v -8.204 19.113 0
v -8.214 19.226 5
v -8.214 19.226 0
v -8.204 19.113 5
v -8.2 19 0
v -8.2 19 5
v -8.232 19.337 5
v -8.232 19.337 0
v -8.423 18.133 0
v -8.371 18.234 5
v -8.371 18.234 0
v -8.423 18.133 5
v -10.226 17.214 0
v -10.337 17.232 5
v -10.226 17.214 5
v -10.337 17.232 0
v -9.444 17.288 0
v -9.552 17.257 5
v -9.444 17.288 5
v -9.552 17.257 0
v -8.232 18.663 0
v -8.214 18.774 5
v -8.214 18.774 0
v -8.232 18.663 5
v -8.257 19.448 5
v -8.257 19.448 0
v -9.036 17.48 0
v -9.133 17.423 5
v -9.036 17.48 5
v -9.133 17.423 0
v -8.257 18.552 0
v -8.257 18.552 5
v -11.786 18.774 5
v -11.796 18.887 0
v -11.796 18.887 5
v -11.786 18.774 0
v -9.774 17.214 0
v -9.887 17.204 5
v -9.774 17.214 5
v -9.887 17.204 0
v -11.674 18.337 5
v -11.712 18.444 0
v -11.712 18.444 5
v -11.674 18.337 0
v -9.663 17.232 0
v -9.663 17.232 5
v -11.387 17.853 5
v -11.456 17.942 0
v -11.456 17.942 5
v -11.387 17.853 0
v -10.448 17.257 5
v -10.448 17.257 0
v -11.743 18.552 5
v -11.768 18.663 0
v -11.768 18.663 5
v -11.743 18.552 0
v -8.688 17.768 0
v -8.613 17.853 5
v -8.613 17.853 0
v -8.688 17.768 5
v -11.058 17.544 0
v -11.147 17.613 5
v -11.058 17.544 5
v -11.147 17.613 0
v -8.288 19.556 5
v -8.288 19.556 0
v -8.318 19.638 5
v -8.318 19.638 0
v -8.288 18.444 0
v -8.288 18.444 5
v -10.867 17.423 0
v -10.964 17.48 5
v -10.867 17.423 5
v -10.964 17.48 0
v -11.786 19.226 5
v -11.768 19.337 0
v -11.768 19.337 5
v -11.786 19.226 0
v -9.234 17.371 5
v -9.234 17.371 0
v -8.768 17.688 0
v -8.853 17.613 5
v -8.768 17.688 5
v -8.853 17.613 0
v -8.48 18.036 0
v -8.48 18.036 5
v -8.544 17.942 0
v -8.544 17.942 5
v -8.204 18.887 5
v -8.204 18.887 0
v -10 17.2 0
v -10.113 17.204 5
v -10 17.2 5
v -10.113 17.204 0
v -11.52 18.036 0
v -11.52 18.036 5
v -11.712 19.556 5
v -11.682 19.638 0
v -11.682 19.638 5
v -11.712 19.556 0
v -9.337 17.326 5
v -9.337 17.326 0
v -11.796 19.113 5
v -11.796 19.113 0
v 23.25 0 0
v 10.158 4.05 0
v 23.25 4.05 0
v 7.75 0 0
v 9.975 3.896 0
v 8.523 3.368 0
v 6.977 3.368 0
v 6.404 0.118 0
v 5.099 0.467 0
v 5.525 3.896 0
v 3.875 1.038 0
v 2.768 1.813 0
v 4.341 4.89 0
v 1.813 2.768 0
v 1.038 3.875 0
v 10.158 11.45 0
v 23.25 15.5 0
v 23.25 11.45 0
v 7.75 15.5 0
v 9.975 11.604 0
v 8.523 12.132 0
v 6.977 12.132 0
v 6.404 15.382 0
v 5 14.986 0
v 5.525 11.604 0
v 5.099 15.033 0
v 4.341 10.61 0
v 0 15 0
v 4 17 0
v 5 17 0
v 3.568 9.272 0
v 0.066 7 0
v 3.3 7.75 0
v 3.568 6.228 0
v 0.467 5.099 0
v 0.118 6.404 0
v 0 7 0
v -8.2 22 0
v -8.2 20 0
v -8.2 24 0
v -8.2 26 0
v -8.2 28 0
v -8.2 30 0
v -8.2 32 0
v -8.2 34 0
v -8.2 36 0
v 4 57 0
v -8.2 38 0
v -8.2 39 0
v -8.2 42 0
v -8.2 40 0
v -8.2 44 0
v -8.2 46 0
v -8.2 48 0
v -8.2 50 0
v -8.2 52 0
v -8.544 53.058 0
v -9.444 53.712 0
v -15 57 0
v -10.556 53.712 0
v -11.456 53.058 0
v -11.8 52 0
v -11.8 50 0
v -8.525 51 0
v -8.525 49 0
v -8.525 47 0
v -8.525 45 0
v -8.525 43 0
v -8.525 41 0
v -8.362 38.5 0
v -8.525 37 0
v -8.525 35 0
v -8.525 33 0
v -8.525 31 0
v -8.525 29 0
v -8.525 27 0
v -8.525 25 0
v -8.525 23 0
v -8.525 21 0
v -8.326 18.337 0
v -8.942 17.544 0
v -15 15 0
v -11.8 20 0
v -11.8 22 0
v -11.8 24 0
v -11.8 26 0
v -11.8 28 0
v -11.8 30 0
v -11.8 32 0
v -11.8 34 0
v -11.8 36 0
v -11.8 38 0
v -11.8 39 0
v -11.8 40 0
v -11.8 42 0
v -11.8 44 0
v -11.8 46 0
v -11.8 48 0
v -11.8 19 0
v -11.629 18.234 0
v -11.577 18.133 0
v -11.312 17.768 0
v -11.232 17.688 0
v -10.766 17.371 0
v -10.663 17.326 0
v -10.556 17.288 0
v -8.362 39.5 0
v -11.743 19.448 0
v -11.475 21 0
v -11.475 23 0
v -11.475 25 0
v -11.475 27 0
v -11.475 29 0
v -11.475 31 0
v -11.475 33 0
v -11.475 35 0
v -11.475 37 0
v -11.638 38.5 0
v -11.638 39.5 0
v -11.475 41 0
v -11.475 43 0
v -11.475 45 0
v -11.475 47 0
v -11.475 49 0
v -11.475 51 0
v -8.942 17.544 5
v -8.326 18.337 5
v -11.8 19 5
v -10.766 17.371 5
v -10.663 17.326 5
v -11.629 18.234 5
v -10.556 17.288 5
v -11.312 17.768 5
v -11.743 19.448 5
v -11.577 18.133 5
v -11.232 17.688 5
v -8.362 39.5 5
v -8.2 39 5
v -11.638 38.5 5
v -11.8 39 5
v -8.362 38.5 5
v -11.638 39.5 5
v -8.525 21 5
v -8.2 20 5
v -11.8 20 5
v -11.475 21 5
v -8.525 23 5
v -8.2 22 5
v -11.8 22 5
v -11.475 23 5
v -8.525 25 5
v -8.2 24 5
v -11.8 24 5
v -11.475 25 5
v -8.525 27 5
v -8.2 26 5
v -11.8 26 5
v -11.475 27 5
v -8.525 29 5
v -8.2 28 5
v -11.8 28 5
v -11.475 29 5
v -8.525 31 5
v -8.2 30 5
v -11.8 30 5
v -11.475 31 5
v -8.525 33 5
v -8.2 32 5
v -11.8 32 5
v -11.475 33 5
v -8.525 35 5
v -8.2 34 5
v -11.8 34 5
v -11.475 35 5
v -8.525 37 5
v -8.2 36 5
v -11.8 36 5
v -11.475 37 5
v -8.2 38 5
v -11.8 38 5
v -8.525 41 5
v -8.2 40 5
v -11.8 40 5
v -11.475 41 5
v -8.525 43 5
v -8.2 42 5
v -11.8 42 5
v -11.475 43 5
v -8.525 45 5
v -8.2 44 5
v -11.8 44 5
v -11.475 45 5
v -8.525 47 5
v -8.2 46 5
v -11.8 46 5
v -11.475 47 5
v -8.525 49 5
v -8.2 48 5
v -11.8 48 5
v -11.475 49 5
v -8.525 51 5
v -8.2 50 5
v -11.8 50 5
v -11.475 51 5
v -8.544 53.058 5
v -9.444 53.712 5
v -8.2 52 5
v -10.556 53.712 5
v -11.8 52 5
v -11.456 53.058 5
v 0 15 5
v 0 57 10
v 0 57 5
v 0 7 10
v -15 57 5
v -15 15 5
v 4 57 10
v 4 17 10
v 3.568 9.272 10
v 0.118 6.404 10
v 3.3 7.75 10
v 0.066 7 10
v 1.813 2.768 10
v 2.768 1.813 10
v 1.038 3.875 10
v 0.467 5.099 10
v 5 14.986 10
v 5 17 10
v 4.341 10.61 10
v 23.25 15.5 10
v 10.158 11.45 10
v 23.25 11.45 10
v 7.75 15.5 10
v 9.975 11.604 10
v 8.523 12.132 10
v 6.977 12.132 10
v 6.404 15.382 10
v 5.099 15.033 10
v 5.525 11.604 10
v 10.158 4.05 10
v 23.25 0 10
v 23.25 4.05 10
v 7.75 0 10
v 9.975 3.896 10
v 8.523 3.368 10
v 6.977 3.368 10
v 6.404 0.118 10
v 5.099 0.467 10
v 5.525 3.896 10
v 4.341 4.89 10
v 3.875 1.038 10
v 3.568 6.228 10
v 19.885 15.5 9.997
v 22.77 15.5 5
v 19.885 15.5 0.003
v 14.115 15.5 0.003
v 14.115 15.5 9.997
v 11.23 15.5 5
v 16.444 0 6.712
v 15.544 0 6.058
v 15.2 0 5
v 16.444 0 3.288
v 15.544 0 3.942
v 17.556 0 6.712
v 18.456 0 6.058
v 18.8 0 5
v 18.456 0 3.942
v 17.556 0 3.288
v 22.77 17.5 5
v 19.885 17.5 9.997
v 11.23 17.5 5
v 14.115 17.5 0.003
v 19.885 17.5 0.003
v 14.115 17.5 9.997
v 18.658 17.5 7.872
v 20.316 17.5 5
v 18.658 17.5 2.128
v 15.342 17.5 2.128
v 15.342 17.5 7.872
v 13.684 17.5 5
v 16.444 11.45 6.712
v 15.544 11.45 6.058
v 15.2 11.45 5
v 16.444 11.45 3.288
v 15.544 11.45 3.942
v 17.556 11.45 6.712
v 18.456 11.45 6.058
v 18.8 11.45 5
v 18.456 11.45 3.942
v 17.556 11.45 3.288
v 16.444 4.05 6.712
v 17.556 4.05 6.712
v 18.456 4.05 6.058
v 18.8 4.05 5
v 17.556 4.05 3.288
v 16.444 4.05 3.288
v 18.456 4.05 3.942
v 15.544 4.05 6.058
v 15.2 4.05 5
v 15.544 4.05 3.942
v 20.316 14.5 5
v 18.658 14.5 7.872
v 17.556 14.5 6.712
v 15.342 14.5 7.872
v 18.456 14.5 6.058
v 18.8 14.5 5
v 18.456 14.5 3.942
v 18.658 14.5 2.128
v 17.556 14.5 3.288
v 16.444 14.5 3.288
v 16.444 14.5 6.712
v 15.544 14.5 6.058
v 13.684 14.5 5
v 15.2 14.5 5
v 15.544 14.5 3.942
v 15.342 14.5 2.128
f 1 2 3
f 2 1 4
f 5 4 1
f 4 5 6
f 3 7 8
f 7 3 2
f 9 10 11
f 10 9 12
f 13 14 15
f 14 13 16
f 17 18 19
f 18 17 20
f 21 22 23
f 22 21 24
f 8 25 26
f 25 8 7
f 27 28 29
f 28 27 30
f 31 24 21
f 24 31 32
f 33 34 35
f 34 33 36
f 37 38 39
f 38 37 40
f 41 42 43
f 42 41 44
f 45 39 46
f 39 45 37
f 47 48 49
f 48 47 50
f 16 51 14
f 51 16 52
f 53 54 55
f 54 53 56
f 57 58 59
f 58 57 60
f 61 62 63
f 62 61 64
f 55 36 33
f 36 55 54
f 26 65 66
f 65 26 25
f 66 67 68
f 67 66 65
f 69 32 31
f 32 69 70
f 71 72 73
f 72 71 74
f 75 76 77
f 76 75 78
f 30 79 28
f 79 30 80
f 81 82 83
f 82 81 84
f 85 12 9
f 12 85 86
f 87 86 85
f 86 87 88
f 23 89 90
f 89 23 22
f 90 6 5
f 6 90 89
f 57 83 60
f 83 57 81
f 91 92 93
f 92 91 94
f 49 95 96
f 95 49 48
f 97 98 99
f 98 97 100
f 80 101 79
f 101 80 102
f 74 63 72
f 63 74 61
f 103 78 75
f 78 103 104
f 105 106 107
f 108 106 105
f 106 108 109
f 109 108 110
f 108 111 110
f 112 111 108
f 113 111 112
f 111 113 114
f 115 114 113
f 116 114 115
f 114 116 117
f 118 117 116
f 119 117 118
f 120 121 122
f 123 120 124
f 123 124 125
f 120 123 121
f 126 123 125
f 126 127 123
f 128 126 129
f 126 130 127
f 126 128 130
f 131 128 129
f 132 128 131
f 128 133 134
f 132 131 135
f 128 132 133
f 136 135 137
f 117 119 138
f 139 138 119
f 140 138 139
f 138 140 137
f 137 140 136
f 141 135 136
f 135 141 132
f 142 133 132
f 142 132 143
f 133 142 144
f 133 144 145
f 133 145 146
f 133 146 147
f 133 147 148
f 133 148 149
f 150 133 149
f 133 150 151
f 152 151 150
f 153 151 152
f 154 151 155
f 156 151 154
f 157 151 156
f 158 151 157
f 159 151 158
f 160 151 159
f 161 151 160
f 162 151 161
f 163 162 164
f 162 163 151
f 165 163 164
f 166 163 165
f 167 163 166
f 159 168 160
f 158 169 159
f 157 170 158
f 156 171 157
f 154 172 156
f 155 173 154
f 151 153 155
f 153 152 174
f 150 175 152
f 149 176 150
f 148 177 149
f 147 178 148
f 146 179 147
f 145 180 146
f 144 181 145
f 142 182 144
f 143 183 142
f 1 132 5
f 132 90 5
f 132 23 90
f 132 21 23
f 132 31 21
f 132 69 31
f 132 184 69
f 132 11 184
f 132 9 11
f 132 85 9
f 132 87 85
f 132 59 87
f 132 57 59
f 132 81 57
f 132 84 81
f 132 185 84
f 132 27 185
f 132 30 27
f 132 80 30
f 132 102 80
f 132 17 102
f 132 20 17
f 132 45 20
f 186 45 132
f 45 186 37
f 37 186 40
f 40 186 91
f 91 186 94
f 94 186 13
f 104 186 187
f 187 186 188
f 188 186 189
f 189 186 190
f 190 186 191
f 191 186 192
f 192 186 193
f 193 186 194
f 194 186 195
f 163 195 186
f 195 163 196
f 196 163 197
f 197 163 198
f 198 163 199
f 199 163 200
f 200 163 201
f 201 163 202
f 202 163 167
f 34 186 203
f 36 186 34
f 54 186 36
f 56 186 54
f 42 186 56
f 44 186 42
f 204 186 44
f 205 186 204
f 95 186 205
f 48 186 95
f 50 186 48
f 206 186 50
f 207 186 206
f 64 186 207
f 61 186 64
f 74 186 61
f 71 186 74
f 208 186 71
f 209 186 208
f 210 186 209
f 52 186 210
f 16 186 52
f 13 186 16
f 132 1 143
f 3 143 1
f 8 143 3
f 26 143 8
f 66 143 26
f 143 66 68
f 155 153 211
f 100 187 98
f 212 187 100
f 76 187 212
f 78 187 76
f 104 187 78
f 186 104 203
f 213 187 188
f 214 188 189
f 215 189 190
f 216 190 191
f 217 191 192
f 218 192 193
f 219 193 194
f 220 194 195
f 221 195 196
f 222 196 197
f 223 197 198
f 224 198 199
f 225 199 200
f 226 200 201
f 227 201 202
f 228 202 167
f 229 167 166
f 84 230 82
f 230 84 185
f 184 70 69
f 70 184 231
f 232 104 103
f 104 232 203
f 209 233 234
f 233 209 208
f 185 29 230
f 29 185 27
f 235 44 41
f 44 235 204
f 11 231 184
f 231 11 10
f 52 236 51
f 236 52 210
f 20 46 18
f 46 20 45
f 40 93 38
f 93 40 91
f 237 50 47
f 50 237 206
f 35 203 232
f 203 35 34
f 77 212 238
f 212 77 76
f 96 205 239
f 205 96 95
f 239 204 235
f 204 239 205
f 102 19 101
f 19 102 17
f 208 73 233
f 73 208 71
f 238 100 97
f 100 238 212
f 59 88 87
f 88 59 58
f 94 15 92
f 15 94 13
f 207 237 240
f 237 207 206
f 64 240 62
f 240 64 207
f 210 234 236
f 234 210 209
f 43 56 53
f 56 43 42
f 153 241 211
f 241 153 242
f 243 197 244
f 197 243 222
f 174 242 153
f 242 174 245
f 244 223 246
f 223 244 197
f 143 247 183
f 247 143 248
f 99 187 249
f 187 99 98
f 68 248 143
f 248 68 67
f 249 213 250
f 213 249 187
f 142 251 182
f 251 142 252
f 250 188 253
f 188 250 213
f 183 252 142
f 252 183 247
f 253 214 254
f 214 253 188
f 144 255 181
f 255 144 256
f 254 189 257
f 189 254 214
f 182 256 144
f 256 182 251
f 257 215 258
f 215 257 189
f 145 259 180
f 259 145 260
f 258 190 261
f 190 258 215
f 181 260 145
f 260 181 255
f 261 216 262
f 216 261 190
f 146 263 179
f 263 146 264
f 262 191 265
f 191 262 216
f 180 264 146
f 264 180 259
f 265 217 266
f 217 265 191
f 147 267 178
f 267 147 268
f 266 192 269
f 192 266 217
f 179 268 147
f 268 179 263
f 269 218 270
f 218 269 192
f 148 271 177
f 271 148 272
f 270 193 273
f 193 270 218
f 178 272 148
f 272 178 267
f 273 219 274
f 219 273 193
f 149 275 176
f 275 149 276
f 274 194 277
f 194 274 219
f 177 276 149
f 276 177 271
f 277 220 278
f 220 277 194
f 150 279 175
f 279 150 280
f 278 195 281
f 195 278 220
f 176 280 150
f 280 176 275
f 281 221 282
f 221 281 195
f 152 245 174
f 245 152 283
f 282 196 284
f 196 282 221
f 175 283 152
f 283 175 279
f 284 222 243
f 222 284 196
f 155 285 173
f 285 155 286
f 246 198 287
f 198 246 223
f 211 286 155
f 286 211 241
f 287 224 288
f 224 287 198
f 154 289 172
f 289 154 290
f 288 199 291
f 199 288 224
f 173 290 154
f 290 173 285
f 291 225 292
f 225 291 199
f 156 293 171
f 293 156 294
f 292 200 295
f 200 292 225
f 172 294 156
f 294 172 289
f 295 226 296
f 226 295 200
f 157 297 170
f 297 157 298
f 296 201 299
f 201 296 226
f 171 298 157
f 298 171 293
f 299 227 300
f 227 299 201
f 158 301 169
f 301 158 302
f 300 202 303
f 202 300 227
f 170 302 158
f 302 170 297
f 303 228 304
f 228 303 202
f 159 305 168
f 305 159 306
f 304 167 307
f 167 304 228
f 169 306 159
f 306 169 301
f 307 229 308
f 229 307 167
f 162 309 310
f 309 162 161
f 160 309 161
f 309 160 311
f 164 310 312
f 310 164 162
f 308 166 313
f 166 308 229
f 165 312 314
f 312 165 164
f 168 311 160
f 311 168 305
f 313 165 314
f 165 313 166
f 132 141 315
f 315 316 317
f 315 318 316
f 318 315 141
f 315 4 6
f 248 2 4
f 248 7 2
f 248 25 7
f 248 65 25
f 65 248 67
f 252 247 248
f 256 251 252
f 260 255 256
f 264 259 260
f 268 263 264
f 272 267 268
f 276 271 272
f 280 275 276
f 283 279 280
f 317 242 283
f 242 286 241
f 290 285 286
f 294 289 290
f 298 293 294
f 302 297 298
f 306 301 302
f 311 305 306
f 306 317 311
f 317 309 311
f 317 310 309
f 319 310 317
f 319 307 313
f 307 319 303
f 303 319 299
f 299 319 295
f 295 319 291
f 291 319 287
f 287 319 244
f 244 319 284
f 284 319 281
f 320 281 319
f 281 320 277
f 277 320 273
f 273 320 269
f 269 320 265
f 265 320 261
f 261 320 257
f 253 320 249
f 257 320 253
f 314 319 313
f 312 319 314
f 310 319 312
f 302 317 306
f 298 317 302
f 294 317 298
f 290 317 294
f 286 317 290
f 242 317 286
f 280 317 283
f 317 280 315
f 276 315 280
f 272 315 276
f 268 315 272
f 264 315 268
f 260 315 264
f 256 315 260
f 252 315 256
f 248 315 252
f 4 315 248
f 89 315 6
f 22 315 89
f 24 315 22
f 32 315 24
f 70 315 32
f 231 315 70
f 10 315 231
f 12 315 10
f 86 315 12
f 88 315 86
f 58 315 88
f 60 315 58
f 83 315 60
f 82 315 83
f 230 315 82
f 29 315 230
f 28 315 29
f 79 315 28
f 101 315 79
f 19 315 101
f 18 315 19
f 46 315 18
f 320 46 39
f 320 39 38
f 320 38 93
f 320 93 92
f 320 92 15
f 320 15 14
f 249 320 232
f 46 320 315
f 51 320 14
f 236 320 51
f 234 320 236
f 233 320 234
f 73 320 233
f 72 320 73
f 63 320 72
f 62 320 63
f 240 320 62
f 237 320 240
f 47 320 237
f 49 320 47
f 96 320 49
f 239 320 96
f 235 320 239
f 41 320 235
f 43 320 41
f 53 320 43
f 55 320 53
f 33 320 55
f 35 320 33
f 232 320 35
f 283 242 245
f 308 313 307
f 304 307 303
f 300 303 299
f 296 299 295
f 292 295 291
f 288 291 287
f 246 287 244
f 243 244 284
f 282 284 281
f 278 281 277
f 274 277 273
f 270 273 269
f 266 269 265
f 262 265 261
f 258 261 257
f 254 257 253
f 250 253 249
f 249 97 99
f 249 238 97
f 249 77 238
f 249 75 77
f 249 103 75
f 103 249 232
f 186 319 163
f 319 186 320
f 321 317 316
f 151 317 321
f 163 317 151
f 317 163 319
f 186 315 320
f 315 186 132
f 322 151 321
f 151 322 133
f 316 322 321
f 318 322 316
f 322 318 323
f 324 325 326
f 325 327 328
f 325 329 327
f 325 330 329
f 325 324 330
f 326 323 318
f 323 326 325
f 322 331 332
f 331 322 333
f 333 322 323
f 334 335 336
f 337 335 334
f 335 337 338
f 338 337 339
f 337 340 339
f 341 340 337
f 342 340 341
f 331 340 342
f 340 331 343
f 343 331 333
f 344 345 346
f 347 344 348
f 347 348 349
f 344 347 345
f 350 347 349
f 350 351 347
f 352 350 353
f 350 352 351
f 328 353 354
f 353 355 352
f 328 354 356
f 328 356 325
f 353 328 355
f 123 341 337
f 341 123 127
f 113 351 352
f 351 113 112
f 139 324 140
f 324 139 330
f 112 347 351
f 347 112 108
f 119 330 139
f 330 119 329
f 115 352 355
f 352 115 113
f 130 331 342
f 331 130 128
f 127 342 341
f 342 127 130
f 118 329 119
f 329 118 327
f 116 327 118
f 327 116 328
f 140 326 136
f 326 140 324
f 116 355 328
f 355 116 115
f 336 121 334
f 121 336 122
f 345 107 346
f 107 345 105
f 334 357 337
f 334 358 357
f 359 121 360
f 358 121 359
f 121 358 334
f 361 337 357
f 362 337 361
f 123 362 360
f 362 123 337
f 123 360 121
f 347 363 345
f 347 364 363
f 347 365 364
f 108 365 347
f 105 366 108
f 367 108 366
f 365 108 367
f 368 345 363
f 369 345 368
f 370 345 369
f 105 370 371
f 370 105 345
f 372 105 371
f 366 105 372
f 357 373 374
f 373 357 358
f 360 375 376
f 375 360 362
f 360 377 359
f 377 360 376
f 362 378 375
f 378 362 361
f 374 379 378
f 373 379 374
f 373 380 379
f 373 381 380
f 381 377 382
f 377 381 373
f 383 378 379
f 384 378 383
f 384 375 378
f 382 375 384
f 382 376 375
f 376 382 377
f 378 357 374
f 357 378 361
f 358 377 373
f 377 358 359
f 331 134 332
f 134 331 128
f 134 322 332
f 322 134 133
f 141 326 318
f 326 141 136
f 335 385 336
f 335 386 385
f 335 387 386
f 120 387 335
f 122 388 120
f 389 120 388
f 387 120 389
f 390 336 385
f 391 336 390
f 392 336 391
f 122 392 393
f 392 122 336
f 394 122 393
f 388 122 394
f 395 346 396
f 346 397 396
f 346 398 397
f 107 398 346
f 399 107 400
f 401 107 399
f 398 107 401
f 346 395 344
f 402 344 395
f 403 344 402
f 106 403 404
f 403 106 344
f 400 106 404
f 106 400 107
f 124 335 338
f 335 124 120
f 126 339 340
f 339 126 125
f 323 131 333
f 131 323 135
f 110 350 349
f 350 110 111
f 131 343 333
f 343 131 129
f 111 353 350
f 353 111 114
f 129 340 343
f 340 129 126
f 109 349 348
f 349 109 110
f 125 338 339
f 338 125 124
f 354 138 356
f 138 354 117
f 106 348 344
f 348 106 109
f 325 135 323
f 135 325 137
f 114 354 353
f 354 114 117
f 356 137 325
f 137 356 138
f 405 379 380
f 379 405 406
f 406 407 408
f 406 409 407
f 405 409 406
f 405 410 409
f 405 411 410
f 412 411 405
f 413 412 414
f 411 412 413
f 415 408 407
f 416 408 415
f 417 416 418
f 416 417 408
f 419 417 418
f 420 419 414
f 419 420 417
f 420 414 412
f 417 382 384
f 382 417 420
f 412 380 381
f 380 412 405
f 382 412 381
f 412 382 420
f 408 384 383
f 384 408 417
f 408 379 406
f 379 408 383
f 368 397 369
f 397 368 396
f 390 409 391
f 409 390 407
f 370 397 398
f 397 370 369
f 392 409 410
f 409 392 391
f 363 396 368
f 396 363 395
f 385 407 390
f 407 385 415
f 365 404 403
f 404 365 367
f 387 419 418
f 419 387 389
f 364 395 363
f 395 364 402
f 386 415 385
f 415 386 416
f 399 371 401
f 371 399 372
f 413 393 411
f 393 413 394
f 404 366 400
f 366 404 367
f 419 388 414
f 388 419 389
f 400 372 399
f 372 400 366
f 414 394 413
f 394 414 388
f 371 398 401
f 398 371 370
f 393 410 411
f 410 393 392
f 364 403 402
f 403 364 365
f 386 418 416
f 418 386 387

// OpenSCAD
// PRUSA Mendel  
// X-Endstop holder
// Used to attach endstop to 8mm X-rods
// GNU GPL v3
// Josef Průša
// josefprusa@me.com
// prusadjs.cz
// modified version creation Coen Roos 14 dec. 2012
// modified version creation Robert Moro 16 dec. 2012


/**
 * @id X-endstop-holder
 * @name X-Endstop holder
 * @category Printed
 * @using 1 m3x20xhex
 * @using 1 m3nut
 * @using 2 m3washer
 */

m3_nut_diameter_horizontal = 6.3;
m8_diameter=8.9;
m3_diameter=3.6;
outer_diameter = m8_diameter/2+3.3;
opening_size = m8_diameter-1.5; //openingsize



module endstop()
{

	// Rodclamp)
	//rodclamp(0);

	// Rodclamp
 	//rotate(a=180, v=[1,0,0]) translate([0,-61,-10]) rodclamp(1);

	// Bridge between rodclamps
	translate([0,15,0])
	{
			cube([4,42,10]);


		difference()
		{

			translate([-15,0,0]) {
			cube([15,42,5]);
			}
			// Holes for endstop switch
			union()
			{
				translate([-10,4,0])
				{
					cylinder(h =120, r = m3_diameter/2, $fn = 100);
					translate([0,20,0])cylinder(h =12, r = m3_diameter/2, $fn = 10);
				}
					//cylinder(h =120, r = m3_diameter/1, $fn = 100);
					translate([-10,5,0])cylinder(h =12, r = m3_diameter/2, $fn = 10);
					translate([-10,7,0])cylinder(h =12, r = m3_diameter/2, $fn = 10);
					translate([-10,9,0])cylinder(h =12, r = m3_diameter/2, $fn = 10);
					translate([-10,11,0])cylinder(h =12, r = m3_diameter/2, $fn = 10);
					translate([-10,13,0])cylinder(h =12, r = m3_diameter/2, $fn = 10);
					translate([-10,15,0])cylinder(h =12, r = m3_diameter/2, $fn = 10);
					translate([-10,17,0])cylinder(h =12, r = m3_diameter/2, $fn = 10);
					translate([-10,19,0])cylinder(h =12, r = m3_diameter/2, $fn = 10);
					translate([-10,21,0])cylinder(h =12, r = m3_diameter/2, $fn = 10);
					translate([-10,23,0])cylinder(h =12, r = m3_diameter/2, $fn = 10);
					translate([-10,25,0])cylinder(h =12, r = m3_diameter/2, $fn = 10);
					translate([-10,27,0])cylinder(h =12, r = m3_diameter/2, $fn = 10);
					translate([-10,29,0])cylinder(h =12, r = m3_diameter/2, $fn = 10);
					translate([-10,31,0])cylinder(h =12, r = m3_diameter/2, $fn = 10);
					translate([-10,33,0])cylinder(h =12, r = m3_diameter/2, $fn = 10);
					translate([-10,35,0])cylinder(h =12, r = m3_diameter/2, $fn = 10);
					translate([-10,37,0])cylinder(h =12, r = m3_diameter/2, $fn = 10);
			//cube([-5,32,5]);
			}
		}
	}

}

module rodclamp(switch)
{
 	difference()
	{
		union()
		{
			translate([outer_diameter, outer_diameter, 0]) cylinder(h =10, r = outer_diameter, $fn = 36);
			translate([outer_diameter, 0, 0]) cube([15.5,outer_diameter*2,10]);
			translate([17, 17.5, 5]) rotate([90, 0, 0]) cylinder(h =5, r = 5.77, $fn = 6);
			translate ([0,7,0]) cube([5,10,10]);
		}
		translate([9, outer_diameter-opening_size/2, -1]) cube([18,opening_size,20]);
		translate([outer_diameter, outer_diameter, -1]) cylinder(h =20, r = m8_diameter/2, $fn = 18);
		translate([17, 19.5, 5]) rotate([90, 0, 0]) cylinder(h =5, r = m3_nut_diameter_horizontal/1.9, $fn = 6);
		//Securing hole
		translate([17, 17, 5]) rotate([90, 0, 0]) cylinder(h =20, r = m3_diameter/2, $fn = 10);
	   }
}
module Aggancio(switch)
{
 	difference()
	{
		union()
		{
			translate([outer_diameter, outer_diameter, 0]) cylinder(h =10, r = outer_diameter, $fn = 36);
			translate([outer_diameter, 0, 0]) cube([15.5,outer_diameter*2,10]);
			translate([17, 17.5, 5]) rotate([90, 0, 0]) cylinder(h =5, r = 5.77, $fn = 6);
			translate ([0,7,0]) cube([5,10,10]);
		}
		translate([9, outer_diameter-opening_size/2, -1]) cube([18,opening_size,20]);
		translate([outer_diameter, outer_diameter, -1]) cylinder(h =20, r = m8_diameter/2, $fn = 18);
		translate([17, 19.5, 5]) rotate([90, 0, 0]) cylinder(h =5, r = m3_nut_diameter_horizontal/1.9, $fn = 6);
		//Securing hole
		translate([17, 17, 5]) rotate([90, 0, 0]) cylinder(h =20, r = m3_diameter/2, $fn = 10);
	   }
}

endstop();
Aggancio();
//rodclamp(0);
